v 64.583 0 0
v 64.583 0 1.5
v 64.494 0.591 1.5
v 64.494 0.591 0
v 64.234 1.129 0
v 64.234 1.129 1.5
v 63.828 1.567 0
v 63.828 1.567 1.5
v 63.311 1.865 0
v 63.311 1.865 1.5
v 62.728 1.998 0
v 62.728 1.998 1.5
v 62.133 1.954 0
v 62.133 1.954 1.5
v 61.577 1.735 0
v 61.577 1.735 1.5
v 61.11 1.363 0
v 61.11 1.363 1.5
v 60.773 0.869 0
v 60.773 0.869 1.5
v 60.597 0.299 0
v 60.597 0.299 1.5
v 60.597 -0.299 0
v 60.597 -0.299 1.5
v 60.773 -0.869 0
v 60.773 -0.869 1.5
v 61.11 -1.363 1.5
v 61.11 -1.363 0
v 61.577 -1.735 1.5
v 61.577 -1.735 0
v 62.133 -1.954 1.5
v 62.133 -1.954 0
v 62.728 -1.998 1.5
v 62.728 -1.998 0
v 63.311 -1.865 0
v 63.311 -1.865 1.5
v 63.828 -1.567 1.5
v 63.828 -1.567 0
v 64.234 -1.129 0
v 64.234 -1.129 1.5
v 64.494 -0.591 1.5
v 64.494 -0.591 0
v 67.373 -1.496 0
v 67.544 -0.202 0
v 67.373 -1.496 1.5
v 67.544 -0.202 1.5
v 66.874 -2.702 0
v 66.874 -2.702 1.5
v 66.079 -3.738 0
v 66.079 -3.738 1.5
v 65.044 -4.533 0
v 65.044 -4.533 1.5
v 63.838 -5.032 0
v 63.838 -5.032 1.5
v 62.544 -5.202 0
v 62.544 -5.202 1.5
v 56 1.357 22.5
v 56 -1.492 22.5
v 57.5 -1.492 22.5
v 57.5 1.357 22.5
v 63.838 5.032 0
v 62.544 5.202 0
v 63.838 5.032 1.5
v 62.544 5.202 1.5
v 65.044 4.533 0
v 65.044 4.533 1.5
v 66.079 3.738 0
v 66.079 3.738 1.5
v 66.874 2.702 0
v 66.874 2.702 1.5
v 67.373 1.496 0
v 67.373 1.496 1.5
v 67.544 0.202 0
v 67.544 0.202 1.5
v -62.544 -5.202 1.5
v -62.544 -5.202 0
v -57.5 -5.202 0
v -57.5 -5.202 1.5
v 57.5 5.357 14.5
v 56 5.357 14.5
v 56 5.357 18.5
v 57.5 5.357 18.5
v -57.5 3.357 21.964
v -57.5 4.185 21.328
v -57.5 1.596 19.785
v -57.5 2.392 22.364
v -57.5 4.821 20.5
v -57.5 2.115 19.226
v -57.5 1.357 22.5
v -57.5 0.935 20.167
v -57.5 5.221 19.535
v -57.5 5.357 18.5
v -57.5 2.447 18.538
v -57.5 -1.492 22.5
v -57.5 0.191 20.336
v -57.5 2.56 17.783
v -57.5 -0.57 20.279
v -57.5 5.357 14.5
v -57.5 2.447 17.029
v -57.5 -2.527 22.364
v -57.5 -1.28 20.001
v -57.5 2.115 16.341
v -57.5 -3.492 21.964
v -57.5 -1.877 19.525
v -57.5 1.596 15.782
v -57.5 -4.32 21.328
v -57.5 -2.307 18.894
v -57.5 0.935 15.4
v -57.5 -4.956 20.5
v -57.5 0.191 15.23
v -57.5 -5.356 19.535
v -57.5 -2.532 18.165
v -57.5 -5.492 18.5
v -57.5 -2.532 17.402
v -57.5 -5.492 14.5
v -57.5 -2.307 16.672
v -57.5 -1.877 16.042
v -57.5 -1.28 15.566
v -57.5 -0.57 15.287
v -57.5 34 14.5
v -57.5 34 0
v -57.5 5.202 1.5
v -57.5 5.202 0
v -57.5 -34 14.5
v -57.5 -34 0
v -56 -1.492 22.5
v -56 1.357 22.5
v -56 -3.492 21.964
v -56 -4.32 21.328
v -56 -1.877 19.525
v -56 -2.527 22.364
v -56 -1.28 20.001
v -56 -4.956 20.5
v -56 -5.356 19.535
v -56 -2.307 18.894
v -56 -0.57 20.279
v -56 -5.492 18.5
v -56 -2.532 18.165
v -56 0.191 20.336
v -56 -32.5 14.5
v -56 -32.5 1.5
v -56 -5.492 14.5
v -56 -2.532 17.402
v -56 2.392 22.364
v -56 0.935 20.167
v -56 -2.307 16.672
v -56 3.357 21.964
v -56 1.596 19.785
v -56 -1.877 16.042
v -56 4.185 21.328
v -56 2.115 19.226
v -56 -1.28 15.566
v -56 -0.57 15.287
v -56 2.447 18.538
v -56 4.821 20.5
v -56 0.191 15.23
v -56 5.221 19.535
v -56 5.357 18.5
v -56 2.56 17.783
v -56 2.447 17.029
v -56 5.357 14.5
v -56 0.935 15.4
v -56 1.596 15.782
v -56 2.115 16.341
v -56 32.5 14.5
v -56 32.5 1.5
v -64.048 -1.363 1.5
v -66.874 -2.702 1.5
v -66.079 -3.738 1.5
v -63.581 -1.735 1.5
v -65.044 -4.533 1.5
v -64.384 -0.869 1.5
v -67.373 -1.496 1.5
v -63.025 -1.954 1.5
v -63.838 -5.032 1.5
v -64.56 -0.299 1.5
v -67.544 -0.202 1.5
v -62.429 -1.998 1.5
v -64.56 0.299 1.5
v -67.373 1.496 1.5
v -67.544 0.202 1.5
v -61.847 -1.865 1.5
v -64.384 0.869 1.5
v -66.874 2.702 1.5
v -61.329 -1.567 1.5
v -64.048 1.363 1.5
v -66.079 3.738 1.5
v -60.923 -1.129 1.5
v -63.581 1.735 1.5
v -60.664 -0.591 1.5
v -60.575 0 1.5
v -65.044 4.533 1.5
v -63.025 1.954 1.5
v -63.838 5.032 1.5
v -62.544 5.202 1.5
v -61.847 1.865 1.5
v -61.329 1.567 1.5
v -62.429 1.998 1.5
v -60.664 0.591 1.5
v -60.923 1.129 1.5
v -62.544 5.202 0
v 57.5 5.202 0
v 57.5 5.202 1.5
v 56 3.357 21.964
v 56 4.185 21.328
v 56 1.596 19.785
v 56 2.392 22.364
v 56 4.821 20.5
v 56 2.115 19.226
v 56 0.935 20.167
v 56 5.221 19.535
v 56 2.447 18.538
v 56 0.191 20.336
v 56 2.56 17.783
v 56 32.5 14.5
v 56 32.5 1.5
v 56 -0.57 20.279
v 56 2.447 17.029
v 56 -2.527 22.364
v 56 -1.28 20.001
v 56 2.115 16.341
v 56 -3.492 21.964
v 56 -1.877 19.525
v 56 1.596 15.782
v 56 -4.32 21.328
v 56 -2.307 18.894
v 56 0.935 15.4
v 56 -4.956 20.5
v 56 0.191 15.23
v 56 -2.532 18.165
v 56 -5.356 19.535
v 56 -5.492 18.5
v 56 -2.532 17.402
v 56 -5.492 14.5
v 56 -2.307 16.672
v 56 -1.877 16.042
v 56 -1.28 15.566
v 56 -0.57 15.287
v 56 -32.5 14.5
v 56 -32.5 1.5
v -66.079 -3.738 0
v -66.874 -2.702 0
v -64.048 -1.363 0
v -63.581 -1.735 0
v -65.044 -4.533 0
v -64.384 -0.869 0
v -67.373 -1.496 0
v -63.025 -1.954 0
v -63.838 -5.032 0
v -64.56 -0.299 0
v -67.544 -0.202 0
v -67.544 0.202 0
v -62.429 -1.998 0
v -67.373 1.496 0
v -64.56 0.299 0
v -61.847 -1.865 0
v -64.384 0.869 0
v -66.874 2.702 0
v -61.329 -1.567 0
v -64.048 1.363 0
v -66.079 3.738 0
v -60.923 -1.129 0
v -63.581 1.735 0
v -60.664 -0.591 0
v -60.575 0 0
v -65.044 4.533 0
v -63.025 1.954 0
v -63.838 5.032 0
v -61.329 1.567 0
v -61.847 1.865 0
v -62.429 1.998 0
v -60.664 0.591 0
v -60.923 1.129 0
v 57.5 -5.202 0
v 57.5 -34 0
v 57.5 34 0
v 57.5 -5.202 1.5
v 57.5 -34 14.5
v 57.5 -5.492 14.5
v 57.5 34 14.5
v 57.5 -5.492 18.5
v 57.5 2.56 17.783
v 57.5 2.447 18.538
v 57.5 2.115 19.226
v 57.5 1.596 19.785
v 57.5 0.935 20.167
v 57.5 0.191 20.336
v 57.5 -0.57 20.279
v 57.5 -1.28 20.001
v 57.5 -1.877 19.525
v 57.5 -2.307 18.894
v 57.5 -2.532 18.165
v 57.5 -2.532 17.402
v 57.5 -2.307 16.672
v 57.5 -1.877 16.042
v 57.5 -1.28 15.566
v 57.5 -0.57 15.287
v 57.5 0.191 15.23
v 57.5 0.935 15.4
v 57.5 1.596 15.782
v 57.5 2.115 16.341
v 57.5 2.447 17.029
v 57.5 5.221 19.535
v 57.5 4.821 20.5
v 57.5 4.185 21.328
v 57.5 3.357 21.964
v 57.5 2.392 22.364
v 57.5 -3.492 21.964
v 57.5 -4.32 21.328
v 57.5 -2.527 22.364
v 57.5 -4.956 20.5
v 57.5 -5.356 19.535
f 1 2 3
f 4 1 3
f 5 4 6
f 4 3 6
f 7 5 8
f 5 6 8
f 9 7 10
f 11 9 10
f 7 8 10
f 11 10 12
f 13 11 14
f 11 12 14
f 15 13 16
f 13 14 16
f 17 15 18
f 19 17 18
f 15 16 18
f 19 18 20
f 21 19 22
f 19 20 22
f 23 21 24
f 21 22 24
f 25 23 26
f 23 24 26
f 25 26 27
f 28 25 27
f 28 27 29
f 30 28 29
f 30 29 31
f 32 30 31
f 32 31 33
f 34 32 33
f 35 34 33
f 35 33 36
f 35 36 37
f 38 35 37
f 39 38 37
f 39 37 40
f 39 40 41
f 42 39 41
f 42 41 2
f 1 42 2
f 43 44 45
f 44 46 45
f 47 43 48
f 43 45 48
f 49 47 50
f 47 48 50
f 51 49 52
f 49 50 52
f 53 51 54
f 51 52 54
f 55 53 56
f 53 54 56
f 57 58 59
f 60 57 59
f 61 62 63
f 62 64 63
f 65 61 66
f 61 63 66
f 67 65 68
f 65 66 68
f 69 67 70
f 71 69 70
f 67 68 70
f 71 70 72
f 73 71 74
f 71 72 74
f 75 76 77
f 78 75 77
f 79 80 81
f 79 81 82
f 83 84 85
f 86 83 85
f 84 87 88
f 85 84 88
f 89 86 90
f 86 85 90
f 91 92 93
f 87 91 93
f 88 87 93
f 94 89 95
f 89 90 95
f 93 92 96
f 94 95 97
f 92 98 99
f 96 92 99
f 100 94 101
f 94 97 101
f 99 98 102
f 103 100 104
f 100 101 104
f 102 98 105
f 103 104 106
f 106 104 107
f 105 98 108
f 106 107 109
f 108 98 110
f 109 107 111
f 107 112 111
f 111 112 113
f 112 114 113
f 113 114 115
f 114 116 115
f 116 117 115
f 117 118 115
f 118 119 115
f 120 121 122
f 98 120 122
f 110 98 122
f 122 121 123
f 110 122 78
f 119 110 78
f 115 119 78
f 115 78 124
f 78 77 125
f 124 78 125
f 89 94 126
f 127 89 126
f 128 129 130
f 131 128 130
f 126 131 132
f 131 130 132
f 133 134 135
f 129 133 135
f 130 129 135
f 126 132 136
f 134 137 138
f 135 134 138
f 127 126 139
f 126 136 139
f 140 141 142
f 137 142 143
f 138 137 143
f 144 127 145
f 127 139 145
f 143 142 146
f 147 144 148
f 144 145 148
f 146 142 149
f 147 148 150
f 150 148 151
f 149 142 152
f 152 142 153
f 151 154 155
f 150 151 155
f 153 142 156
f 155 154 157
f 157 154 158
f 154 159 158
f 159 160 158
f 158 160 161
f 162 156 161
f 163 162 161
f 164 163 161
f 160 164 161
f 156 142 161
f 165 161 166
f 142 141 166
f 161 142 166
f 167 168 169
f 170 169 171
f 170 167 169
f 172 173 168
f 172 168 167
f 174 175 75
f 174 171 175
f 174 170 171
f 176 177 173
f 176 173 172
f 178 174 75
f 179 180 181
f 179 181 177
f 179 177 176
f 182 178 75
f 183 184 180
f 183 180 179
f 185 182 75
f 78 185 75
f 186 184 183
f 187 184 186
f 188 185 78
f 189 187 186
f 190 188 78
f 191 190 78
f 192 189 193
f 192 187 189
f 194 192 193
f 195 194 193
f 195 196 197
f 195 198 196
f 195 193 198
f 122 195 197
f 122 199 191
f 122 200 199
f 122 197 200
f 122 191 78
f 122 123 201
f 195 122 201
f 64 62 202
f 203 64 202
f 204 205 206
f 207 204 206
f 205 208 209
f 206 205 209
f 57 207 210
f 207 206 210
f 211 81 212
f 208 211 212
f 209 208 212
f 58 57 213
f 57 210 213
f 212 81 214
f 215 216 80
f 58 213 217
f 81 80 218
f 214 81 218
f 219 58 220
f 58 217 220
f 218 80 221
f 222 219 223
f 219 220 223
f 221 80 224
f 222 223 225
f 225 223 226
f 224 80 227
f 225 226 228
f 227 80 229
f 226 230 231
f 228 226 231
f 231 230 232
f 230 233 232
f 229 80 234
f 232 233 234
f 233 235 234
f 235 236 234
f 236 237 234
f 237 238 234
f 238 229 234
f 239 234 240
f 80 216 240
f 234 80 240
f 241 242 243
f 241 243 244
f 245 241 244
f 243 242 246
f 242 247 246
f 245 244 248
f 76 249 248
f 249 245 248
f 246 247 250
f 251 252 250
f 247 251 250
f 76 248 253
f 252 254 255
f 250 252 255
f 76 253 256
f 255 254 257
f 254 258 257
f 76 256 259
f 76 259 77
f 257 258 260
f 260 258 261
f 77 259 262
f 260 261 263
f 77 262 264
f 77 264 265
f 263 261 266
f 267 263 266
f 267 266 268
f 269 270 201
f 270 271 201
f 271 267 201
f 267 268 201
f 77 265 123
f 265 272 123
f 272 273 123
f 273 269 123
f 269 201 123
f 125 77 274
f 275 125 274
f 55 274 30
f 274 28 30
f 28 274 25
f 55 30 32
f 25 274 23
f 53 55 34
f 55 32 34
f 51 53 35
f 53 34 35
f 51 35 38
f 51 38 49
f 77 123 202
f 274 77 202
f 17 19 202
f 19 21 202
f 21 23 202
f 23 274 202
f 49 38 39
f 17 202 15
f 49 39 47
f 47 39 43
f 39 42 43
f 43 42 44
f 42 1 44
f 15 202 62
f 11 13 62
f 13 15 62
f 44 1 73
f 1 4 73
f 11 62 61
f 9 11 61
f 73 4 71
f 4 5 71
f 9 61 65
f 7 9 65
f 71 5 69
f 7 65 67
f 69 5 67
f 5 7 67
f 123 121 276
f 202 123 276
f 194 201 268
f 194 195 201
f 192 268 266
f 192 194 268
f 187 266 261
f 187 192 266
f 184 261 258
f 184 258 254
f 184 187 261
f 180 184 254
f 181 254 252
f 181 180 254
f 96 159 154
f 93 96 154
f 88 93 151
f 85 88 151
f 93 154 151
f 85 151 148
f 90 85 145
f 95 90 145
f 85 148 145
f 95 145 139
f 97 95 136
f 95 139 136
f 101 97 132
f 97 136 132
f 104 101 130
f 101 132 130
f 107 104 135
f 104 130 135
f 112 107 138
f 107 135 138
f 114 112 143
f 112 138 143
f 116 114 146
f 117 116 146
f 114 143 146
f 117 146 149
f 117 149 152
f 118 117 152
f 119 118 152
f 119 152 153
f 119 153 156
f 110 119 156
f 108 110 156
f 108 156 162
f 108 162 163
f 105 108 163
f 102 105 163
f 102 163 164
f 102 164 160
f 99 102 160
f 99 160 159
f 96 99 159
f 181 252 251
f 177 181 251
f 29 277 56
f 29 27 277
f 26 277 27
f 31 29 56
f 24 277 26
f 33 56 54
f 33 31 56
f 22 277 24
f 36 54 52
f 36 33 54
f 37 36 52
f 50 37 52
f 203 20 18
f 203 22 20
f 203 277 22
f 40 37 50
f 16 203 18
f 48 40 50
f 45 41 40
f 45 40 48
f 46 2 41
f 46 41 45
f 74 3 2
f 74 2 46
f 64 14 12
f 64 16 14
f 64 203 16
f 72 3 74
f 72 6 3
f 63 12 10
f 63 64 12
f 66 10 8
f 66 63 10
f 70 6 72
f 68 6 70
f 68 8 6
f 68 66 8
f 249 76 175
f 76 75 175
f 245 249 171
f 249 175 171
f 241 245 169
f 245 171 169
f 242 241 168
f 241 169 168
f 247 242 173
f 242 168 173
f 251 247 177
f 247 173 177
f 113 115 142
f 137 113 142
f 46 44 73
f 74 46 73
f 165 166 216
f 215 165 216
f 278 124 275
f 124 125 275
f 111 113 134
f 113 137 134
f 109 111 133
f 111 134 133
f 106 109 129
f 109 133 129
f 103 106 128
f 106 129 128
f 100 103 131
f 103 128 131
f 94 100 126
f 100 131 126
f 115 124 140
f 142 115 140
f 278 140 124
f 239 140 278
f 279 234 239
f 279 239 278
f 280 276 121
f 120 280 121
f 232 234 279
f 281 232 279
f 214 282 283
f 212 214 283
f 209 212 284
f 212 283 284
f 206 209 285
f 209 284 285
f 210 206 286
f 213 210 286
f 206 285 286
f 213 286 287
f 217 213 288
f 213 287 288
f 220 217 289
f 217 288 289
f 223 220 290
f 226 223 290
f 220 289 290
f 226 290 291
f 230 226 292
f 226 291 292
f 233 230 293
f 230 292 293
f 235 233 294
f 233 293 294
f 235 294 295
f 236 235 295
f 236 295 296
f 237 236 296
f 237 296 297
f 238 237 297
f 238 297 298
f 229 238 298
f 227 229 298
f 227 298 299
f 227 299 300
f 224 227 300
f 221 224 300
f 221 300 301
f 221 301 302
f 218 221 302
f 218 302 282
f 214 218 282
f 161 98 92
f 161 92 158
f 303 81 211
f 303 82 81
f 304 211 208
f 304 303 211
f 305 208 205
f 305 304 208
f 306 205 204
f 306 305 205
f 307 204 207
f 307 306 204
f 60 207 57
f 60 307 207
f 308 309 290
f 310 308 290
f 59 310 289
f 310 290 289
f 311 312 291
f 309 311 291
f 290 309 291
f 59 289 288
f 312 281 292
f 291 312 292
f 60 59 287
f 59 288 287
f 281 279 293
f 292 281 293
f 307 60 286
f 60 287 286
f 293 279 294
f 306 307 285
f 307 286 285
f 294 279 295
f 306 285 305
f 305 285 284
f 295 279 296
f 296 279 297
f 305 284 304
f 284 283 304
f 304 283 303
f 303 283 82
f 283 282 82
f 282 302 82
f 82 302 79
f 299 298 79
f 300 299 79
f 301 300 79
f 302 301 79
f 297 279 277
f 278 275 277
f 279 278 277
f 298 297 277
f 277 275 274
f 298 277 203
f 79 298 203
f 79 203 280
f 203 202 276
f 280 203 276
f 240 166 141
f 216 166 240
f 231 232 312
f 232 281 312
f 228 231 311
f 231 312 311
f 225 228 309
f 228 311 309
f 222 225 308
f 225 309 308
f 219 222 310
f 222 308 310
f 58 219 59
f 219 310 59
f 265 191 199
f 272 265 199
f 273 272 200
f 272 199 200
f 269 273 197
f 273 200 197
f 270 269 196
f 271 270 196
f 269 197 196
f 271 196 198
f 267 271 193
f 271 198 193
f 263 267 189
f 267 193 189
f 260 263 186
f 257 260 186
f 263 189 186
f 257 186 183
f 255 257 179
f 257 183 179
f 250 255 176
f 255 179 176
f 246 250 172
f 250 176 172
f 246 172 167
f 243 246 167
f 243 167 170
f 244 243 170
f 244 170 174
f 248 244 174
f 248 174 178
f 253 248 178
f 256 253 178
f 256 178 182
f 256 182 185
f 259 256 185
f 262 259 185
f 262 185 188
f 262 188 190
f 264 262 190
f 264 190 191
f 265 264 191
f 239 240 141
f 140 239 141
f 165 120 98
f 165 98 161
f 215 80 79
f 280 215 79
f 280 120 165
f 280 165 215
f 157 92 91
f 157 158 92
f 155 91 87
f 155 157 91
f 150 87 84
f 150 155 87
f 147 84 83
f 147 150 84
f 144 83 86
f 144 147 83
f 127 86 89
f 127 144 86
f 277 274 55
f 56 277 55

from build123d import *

# Parameters (mm, degrees)
F1_DEPTH  = 1.5
F3_DEPTH  = 13
F4_R      = 2.003864
F5_DEPTH  = 2
F6_R      = 5
F7_W      = 1.5
F7_H      = 10.848721
F8_DEPTH  = 8
F9_R      = 4
F10_R     = 2.560251
F11_DEPTH = 125


with BuildPart() as f1:
    # F0 (on Top) → F1 (new body)
    with BuildSketch(Plane.XY):
        Polygon((57.5, 5.202384), (57.5, 34), (-57.5, 34), (-57.5, 5.202384), (-57.5, -5.202384), (-57.5, -34), (57.5, -34), (57.5, -5.202384), (57.5, 0), align=None)
        Polygon((-57.5, -5.202384), (-57.5, 5.202384), (-67.543589, 5.202384), (-67.543589, 0), (-67.543589, -5.202384), align=None)
        Polygon((67.543589, 5.202384), (57.5, 5.202384), (57.5, 0), (57.5, -5.202384), (67.543589, -5.202384), (67.543589, 0), align=None)
    extrude(amount=F1_DEPTH)

    # F2 (on face) → F3 (join)
    with BuildSketch(Plane.XY.offset(1.5)):
        Polygon((-57.5, 34), (-57.5, 5.202384), (-57.5, -5.202384), (-57.5, -34), (57.5, -34), (57.5, -5.202384), (57.5, 5.202384), (57.5, 34), align=None)
        Polygon((-56, 32.5), (56, 32.5), (56, 5.202384), (56, -5.202384), (56, -32.5), (-56, -32.5), (-56, -5.202384), (-56, 5.202384), align=None, mode=Mode.SUBTRACT)
    extrude(amount=F3_DEPTH)

    # F4 (on face) → F5 (cut)
    with BuildSketch(Plane.XY.offset(1.5)):
        with Locations((-62.578715, 0)):
            Circle(F4_R)
        with Locations((62.578715, 0)):
            Circle(F4_R)
    extrude(amount=-F5_DEPTH, mode=Mode.SUBTRACT)

    # F6
    f6_edges = [f1.edges().sort_by_distance(p)[0] for p in [
        (-67.543589, 5.202384, 0.75),
        (-67.543589, -5.202384, 0.75),
        (67.543589, 5.202384, 0.75),
        (67.543589, -5.202384, 0.75),
    ]]
    fillet(f6_edges, radius=F6_R)

    # F7 (on face) → F8 (join)
    with BuildSketch(Plane.XY.offset(14.5)):
        with Locations((-56.75, -0.06754)):
            Rectangle(F7_W, F7_H)
        with Locations((56.75, -0.06754)):
            Rectangle(F7_W, F7_H)
    extrude(amount=F8_DEPTH)

    # F9
    f9_edges = [f1.edges().sort_by_distance(p)[0] for p in [
        (-56.75, -5.491901, 22.5),
        (-56.75, 5.35682, 22.5),
        (56.75, -5.491901, 22.5),
        (56.75, 5.35682, 22.5),
    ]]
    fillet(f9_edges, radius=F9_R)

    # F10 (on face) → F11 (cut)
    with BuildSketch(Plane.YZ.offset(57.5)):
        with Locations((0, 17.783318)):
            Circle(F10_R)
    extrude(amount=-F11_DEPTH, mode=Mode.SUBTRACT)


solid = f1.part
